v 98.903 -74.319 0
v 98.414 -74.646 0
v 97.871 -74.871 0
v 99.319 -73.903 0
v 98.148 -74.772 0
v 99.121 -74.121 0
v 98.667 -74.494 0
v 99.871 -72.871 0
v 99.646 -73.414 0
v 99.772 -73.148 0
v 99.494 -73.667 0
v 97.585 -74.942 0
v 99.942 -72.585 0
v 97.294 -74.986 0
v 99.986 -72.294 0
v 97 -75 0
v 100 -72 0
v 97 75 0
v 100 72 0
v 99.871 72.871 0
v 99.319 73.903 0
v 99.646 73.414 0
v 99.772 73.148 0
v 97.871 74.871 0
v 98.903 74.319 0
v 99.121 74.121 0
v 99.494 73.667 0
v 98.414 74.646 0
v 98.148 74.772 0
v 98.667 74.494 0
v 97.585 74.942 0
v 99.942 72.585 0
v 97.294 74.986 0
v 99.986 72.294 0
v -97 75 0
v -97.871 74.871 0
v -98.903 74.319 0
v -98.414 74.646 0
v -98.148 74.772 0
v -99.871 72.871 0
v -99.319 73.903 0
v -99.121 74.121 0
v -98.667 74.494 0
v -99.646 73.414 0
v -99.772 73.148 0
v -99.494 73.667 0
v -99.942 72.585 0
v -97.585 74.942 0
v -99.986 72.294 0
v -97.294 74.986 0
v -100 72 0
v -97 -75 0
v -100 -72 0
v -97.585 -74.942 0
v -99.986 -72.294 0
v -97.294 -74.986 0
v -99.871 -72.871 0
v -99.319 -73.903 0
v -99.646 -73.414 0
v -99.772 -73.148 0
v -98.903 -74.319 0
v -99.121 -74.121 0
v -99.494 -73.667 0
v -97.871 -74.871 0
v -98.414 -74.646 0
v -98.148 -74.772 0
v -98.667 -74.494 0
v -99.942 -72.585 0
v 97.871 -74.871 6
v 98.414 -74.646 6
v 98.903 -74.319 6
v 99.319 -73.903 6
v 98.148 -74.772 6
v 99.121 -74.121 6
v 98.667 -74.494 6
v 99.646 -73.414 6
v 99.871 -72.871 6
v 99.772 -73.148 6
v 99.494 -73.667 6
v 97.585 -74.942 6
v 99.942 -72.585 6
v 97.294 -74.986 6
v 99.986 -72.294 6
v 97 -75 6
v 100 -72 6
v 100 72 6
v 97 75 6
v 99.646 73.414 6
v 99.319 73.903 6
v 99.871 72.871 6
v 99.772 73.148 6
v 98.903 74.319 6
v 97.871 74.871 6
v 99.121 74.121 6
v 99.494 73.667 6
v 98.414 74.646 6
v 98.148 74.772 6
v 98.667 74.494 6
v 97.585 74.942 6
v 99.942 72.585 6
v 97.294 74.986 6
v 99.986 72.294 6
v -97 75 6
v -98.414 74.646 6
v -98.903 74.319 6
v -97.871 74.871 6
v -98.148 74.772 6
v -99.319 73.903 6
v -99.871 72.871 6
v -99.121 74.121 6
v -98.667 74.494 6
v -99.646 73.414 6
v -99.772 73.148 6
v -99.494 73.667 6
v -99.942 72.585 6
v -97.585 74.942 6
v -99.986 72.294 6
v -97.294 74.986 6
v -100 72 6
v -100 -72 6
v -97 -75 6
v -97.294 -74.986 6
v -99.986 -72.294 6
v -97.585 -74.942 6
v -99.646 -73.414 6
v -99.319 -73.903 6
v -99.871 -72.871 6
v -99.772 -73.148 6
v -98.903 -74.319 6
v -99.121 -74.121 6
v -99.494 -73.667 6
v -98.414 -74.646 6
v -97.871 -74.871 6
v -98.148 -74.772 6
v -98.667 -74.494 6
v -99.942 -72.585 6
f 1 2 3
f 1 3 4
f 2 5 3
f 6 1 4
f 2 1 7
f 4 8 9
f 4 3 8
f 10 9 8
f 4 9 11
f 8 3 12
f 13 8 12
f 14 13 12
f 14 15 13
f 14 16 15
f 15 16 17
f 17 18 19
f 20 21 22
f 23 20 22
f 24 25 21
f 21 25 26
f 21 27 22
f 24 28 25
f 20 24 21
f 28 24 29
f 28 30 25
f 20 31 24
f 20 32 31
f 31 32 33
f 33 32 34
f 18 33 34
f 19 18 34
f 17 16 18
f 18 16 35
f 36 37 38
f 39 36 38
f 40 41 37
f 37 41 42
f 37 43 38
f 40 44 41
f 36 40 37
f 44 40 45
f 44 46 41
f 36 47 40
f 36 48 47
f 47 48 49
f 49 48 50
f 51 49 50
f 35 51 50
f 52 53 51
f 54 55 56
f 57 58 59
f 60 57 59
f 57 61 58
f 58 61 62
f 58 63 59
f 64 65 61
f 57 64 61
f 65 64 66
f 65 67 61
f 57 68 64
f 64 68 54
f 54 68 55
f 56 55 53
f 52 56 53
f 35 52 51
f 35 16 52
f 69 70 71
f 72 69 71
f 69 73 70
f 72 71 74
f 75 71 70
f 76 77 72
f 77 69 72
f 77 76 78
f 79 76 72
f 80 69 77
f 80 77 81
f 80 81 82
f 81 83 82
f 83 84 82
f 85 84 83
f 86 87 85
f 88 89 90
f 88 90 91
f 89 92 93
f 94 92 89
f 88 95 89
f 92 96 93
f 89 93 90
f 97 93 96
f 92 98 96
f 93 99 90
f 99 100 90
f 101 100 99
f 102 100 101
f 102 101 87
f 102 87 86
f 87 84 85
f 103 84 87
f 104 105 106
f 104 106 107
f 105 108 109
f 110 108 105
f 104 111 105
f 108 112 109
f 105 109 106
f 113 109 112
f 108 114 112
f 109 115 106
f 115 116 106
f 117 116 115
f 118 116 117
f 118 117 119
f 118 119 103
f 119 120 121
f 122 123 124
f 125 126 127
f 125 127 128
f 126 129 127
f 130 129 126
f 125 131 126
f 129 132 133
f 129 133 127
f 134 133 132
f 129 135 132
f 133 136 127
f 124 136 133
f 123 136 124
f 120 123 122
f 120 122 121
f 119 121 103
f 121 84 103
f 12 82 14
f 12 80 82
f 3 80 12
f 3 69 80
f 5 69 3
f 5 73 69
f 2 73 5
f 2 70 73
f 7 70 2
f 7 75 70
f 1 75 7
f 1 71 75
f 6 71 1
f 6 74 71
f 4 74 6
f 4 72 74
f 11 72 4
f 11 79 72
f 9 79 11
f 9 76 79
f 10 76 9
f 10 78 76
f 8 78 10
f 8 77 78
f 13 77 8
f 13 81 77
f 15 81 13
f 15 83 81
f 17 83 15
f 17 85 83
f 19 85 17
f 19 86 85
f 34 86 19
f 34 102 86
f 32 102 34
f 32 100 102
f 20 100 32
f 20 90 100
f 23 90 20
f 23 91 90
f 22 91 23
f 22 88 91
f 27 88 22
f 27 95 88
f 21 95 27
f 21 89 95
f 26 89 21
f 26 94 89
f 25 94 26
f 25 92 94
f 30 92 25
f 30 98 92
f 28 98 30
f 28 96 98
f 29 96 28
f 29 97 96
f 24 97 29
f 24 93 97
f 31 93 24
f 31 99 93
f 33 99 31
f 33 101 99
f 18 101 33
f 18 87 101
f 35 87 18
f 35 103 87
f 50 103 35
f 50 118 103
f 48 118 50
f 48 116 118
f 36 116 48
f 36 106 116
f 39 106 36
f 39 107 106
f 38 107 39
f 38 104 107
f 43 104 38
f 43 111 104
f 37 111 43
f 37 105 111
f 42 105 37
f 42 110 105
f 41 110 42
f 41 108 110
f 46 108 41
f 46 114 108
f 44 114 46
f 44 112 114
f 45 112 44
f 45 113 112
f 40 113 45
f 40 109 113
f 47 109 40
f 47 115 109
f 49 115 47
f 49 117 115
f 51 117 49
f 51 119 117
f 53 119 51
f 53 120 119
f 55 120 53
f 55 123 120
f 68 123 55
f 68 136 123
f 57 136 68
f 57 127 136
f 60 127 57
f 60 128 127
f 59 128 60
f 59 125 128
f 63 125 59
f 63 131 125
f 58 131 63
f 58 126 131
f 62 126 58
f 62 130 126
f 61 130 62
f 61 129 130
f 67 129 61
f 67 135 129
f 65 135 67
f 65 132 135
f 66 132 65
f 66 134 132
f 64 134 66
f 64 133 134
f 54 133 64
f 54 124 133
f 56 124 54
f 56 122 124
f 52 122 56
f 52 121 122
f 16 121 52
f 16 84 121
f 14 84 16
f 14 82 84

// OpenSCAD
$fn = 64;

length = 200;
width  = 150;
thickness = 6;

corner_radius = 3;

module rounded_plate(l, w, t, r){
    r2 = min(r, l/2, w/2);
    linear_extrude(height = t)
        offset(r = r2)
            square([l - 2*r2, w - 2*r2], center = true);
}

color([0.75, 0.78, 0.80])
    rounded_plate(length, width, thickness, corner_radius);
